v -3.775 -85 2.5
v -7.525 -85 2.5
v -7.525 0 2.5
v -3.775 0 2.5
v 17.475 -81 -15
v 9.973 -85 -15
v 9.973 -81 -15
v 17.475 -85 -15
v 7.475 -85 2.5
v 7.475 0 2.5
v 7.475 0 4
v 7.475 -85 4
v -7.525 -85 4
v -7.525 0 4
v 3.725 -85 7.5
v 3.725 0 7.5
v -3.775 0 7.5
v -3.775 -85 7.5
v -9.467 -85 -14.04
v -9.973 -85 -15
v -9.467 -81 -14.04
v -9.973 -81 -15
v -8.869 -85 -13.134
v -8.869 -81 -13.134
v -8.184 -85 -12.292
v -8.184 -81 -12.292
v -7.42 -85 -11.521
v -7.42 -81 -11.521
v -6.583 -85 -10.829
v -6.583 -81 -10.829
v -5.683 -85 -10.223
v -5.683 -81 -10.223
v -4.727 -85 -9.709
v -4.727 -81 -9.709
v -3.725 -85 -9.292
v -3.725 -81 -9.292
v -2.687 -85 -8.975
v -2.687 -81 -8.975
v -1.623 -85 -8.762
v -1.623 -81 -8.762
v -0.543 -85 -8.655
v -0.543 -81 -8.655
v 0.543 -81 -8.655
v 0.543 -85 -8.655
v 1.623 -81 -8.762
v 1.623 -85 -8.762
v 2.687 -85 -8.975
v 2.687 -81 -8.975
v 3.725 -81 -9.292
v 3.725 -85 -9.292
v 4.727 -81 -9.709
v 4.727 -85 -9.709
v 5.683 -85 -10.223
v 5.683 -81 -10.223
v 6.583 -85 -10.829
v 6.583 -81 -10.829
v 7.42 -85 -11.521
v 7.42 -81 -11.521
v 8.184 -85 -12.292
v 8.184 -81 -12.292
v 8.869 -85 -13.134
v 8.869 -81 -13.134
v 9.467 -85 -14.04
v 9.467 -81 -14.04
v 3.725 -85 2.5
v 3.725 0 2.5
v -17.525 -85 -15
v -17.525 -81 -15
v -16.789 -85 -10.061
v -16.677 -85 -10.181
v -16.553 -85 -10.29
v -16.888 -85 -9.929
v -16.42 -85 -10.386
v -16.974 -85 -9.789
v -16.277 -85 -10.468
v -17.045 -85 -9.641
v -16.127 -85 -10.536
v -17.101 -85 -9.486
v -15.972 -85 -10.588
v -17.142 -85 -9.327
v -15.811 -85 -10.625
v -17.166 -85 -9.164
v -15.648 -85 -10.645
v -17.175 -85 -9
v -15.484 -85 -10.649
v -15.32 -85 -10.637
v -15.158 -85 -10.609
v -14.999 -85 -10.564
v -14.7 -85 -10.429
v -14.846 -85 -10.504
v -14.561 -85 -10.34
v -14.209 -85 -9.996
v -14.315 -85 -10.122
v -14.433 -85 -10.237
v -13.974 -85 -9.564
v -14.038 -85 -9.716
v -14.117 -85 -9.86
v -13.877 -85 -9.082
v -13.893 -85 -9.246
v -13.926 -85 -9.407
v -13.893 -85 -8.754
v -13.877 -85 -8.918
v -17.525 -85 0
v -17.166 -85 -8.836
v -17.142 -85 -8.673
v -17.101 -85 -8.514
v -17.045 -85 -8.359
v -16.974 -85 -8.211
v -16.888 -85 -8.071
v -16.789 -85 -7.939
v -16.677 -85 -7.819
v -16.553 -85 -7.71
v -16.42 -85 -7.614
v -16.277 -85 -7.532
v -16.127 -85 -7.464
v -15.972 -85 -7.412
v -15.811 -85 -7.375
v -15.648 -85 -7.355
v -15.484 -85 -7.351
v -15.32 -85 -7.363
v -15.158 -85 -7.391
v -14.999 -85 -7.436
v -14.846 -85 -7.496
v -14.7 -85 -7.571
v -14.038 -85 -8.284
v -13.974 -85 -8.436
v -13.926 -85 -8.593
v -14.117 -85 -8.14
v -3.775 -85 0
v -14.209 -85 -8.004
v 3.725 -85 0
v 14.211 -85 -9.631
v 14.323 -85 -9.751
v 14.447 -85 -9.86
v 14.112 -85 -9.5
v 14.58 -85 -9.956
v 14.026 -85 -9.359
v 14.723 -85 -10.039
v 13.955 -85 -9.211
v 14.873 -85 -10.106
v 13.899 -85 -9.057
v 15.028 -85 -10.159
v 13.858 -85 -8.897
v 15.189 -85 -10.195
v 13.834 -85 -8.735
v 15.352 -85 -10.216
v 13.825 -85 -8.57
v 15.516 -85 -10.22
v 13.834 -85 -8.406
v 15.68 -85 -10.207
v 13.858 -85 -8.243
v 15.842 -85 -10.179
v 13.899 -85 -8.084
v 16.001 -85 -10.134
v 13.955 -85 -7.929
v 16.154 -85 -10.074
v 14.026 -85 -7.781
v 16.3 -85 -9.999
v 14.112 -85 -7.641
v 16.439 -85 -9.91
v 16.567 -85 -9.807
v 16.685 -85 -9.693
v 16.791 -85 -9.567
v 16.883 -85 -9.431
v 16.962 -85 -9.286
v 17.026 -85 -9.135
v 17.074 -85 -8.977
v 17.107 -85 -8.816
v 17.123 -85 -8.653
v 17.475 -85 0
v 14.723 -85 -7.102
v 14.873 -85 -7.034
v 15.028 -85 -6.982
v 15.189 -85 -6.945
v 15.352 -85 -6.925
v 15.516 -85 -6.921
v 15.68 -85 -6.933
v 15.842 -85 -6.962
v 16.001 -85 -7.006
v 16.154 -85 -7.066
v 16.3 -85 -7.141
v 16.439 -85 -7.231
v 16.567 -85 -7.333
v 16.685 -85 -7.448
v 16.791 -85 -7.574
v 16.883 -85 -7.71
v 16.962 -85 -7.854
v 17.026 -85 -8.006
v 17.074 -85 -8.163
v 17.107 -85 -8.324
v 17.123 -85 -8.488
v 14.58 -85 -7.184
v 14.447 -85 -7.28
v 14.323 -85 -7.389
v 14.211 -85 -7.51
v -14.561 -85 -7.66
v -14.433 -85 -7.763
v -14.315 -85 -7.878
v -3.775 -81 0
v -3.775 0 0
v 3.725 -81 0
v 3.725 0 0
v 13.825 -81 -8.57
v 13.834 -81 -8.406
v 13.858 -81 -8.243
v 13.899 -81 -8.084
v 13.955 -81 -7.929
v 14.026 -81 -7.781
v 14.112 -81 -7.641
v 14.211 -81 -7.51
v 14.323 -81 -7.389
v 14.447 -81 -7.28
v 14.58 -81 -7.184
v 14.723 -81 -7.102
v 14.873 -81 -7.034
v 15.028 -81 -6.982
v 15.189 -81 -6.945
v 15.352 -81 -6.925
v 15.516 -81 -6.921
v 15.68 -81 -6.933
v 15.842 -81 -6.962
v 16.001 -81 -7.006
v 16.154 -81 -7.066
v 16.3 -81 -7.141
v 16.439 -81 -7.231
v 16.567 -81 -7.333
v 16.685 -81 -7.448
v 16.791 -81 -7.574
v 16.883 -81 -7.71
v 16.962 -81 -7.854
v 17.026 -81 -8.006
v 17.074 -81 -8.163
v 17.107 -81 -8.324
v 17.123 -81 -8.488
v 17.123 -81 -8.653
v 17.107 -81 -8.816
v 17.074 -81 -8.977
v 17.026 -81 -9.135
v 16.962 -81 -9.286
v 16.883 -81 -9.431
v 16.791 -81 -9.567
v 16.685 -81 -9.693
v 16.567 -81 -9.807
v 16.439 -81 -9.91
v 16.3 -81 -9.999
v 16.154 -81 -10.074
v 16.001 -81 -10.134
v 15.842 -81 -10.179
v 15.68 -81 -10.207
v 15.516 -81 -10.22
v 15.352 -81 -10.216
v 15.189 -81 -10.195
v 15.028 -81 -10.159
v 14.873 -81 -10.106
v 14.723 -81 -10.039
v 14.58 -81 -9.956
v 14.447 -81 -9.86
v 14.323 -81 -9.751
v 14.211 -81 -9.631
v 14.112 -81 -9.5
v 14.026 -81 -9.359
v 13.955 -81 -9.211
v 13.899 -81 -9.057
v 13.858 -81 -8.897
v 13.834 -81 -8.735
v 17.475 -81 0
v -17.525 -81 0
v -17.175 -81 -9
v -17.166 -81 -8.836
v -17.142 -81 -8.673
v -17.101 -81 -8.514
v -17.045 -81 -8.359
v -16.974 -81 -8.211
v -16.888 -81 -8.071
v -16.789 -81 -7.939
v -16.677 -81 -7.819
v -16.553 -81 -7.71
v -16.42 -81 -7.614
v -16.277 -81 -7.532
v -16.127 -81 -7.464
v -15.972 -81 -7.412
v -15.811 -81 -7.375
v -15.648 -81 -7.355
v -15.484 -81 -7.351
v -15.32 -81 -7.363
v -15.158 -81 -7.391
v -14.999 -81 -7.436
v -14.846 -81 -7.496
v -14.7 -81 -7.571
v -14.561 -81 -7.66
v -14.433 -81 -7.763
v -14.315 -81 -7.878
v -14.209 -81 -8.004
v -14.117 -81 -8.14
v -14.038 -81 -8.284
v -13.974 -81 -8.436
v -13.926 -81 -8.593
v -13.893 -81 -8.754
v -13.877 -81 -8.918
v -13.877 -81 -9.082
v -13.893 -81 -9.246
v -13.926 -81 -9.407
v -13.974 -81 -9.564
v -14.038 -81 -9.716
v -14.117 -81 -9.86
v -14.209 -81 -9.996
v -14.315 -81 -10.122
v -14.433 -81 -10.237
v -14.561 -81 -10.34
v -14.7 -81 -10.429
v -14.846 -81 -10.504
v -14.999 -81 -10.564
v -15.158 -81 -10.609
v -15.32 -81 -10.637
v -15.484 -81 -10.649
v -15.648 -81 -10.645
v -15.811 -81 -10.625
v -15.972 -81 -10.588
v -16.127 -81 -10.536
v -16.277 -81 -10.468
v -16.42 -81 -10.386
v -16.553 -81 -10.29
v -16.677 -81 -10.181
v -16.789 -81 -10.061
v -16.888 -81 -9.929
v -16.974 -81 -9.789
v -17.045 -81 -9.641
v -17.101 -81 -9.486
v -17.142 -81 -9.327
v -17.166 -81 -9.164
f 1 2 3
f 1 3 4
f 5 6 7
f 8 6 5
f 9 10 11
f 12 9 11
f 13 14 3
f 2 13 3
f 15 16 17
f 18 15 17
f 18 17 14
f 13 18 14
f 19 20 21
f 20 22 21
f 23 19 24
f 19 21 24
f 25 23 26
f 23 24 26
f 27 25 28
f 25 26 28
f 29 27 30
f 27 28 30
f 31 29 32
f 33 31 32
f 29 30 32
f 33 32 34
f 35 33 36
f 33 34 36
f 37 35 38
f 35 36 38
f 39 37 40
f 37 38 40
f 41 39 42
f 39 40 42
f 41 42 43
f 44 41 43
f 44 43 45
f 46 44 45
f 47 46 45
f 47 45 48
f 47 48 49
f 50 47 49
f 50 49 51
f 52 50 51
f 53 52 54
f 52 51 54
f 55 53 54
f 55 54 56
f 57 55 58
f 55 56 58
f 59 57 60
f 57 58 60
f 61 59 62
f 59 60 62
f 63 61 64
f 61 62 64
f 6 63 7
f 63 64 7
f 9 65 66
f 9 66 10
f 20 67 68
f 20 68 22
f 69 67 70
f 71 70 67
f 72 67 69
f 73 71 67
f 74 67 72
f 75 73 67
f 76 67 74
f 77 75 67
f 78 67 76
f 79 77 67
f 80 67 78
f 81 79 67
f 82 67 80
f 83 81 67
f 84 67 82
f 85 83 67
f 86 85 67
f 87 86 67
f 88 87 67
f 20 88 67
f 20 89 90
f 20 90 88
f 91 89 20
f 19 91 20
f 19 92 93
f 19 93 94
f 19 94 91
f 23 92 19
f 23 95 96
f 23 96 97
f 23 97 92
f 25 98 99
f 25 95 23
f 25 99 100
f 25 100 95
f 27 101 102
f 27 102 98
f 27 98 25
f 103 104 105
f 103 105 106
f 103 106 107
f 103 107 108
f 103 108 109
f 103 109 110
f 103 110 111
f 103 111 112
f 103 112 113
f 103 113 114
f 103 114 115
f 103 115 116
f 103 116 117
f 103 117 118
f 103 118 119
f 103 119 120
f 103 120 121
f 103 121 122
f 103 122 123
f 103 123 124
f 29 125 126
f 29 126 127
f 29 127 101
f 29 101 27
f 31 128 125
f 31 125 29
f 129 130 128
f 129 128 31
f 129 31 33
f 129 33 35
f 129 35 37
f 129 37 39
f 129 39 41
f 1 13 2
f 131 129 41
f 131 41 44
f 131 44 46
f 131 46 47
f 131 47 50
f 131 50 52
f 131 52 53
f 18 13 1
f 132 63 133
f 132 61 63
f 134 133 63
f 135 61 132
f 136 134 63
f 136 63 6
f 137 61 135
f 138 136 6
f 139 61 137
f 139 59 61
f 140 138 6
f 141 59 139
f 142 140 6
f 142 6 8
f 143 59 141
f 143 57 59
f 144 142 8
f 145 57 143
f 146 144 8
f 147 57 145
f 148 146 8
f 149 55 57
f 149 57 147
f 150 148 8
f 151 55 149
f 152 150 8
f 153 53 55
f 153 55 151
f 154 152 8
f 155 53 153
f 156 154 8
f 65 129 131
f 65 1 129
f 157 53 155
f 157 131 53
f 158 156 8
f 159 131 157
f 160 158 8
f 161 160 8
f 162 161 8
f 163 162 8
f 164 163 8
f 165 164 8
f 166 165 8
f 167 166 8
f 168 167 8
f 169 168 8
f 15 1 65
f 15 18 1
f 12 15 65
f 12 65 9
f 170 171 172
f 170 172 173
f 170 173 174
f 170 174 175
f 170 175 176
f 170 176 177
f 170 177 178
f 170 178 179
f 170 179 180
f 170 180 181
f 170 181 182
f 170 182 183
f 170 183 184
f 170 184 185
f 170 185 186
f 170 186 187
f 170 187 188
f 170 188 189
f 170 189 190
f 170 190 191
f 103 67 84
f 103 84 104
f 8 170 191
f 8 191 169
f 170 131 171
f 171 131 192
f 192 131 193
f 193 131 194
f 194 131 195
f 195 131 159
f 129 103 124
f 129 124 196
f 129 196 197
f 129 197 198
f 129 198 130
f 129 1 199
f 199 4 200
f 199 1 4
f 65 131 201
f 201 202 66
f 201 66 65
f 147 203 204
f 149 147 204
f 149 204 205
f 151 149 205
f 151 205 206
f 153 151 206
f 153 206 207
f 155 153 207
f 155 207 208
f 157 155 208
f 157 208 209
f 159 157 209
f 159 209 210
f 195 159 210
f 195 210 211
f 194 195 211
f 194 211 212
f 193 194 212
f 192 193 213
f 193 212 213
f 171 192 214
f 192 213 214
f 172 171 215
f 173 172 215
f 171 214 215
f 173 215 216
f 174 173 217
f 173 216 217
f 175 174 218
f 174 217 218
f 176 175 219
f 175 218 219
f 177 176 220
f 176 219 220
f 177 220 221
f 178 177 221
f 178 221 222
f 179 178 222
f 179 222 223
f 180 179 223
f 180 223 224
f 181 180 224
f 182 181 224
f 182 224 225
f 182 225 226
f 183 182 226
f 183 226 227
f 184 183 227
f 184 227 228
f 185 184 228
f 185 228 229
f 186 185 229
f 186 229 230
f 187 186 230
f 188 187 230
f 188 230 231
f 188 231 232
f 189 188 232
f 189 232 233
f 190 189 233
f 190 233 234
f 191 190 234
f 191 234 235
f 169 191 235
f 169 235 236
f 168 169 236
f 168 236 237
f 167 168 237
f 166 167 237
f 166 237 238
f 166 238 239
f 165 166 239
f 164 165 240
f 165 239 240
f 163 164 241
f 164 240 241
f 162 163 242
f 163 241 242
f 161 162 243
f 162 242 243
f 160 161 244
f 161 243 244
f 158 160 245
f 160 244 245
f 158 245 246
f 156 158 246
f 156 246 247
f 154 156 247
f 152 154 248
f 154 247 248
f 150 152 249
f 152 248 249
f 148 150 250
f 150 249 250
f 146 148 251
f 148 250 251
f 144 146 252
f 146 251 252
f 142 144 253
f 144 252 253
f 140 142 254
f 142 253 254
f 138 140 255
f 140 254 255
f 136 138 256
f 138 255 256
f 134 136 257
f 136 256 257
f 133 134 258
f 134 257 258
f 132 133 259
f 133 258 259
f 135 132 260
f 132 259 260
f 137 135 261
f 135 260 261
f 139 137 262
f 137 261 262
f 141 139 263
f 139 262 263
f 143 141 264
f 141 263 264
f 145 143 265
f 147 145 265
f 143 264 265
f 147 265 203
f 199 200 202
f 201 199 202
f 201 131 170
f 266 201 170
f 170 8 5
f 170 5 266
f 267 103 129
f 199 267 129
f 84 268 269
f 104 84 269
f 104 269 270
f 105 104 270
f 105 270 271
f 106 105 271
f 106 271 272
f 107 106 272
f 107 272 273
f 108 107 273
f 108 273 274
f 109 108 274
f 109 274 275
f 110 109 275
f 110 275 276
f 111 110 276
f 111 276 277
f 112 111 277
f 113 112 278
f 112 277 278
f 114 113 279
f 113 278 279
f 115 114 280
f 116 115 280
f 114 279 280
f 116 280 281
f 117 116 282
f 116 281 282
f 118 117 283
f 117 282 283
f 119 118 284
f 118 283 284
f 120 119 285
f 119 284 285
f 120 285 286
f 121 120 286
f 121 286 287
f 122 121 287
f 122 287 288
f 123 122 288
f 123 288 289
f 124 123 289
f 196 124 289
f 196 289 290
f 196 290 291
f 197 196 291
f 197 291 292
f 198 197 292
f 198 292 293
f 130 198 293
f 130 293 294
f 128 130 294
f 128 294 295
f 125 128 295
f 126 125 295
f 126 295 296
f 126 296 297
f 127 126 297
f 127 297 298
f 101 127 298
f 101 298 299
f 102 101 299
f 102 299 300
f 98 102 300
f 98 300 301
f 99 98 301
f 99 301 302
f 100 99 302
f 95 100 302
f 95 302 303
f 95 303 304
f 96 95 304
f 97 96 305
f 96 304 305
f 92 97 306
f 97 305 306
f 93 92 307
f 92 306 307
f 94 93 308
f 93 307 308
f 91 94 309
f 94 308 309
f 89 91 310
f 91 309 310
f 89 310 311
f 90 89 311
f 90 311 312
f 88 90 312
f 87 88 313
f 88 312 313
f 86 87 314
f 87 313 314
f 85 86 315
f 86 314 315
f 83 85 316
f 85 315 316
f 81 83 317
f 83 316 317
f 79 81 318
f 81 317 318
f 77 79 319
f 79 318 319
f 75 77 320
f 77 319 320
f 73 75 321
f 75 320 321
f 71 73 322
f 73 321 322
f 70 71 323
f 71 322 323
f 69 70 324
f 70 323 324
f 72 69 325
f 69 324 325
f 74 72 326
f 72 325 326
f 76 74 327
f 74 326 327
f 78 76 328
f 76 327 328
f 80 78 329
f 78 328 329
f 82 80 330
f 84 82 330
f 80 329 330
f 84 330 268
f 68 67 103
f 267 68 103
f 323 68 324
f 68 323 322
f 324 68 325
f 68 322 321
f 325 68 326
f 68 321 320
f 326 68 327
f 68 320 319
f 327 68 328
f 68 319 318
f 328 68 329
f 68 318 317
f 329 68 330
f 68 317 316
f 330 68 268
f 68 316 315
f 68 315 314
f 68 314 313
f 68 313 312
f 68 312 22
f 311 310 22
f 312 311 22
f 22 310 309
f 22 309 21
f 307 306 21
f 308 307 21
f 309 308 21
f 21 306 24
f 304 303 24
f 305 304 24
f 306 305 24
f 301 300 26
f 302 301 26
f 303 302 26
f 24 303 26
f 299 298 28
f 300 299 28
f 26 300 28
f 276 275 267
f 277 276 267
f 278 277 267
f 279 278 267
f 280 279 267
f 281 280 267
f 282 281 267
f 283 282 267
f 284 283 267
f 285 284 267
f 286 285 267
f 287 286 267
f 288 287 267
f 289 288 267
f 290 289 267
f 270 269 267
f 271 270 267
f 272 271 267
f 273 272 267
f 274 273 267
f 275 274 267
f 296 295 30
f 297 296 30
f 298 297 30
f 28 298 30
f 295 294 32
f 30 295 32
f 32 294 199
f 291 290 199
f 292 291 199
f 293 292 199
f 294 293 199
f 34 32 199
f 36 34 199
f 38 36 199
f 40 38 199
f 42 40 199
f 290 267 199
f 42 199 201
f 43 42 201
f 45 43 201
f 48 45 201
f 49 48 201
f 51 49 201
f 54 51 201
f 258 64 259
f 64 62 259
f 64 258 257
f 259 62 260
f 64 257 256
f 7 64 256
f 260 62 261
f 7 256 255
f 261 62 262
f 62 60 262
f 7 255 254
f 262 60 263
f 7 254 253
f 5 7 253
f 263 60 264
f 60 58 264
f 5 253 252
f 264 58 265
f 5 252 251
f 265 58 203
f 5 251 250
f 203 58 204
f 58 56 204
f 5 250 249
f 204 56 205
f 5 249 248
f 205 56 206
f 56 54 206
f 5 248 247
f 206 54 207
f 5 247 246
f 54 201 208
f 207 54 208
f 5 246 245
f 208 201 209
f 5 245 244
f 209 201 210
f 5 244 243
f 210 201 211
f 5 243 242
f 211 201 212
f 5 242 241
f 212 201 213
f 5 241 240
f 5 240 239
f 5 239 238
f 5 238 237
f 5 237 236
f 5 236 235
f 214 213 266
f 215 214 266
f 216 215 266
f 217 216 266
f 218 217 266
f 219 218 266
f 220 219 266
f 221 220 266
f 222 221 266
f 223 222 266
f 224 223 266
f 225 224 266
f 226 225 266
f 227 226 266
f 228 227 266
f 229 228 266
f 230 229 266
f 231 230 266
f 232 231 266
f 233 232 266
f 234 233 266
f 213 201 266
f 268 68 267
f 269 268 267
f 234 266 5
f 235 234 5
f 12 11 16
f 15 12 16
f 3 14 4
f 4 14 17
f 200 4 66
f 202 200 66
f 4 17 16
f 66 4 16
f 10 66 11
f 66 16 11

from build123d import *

# Parameters (mm, degrees)
F1_DEPTH = 85
F2_W     = 35
F2_H     = 15
F3_DEPTH = 4
F5_D     = 3.3
F5_DEPTH = 30
F5_TIP   = 0.9914200214
F7_D     = 22
F7_DEPTH = 30
F7_TIP   = 6.6094668093


with BuildPart() as f1:
    # F0 (on Front) → F1 (new body)
    with BuildSketch(Plane.XZ):
        Polygon((-3.7746716016, 2.5), (-3.7746716016, 0), (3.7253283984, 0), (3.7253283984, 2.5), (7.4753283984, 2.5), (7.4753283984, 4), (3.7253283984, 7.5), (-3.7746716016, 7.5), (-7.5246716016, 4), (-7.5246716016, 2.5), align=None)
    extrude(amount=F1_DEPTH)

    # F2 (on face) → F3 (join)
    with BuildSketch(Plane.XZ.offset(85)):
        with Locations((-0.0246716016, -7.5)):
            Rectangle(F2_W, F2_H)
    extrude(amount=-F3_DEPTH)

    # F5
    with Locations(Plane.XZ.offset(85)):
        with Locations((-15.5246716016, -9), (15.4753283984, -8.5702965236)):
            Hole(F5_D / 2, depth=F5_DEPTH)
            with Locations((0, 0, -(F5_DEPTH + F5_TIP / 2))):  # 118° drill point
                Cone(0, F5_D / 2, F5_TIP, mode=Mode.SUBTRACT)

    # F7
    with Locations(Plane.XZ.offset(85)):
        with Locations((0, -19.6417048573)):
            Hole(F7_D / 2, depth=F7_DEPTH)
            with Locations((0, 0, -(F7_DEPTH + F7_TIP / 2))):  # 118° drill point
                Cone(0, F7_D / 2, F7_TIP, mode=Mode.SUBTRACT)


solid = f1.part
